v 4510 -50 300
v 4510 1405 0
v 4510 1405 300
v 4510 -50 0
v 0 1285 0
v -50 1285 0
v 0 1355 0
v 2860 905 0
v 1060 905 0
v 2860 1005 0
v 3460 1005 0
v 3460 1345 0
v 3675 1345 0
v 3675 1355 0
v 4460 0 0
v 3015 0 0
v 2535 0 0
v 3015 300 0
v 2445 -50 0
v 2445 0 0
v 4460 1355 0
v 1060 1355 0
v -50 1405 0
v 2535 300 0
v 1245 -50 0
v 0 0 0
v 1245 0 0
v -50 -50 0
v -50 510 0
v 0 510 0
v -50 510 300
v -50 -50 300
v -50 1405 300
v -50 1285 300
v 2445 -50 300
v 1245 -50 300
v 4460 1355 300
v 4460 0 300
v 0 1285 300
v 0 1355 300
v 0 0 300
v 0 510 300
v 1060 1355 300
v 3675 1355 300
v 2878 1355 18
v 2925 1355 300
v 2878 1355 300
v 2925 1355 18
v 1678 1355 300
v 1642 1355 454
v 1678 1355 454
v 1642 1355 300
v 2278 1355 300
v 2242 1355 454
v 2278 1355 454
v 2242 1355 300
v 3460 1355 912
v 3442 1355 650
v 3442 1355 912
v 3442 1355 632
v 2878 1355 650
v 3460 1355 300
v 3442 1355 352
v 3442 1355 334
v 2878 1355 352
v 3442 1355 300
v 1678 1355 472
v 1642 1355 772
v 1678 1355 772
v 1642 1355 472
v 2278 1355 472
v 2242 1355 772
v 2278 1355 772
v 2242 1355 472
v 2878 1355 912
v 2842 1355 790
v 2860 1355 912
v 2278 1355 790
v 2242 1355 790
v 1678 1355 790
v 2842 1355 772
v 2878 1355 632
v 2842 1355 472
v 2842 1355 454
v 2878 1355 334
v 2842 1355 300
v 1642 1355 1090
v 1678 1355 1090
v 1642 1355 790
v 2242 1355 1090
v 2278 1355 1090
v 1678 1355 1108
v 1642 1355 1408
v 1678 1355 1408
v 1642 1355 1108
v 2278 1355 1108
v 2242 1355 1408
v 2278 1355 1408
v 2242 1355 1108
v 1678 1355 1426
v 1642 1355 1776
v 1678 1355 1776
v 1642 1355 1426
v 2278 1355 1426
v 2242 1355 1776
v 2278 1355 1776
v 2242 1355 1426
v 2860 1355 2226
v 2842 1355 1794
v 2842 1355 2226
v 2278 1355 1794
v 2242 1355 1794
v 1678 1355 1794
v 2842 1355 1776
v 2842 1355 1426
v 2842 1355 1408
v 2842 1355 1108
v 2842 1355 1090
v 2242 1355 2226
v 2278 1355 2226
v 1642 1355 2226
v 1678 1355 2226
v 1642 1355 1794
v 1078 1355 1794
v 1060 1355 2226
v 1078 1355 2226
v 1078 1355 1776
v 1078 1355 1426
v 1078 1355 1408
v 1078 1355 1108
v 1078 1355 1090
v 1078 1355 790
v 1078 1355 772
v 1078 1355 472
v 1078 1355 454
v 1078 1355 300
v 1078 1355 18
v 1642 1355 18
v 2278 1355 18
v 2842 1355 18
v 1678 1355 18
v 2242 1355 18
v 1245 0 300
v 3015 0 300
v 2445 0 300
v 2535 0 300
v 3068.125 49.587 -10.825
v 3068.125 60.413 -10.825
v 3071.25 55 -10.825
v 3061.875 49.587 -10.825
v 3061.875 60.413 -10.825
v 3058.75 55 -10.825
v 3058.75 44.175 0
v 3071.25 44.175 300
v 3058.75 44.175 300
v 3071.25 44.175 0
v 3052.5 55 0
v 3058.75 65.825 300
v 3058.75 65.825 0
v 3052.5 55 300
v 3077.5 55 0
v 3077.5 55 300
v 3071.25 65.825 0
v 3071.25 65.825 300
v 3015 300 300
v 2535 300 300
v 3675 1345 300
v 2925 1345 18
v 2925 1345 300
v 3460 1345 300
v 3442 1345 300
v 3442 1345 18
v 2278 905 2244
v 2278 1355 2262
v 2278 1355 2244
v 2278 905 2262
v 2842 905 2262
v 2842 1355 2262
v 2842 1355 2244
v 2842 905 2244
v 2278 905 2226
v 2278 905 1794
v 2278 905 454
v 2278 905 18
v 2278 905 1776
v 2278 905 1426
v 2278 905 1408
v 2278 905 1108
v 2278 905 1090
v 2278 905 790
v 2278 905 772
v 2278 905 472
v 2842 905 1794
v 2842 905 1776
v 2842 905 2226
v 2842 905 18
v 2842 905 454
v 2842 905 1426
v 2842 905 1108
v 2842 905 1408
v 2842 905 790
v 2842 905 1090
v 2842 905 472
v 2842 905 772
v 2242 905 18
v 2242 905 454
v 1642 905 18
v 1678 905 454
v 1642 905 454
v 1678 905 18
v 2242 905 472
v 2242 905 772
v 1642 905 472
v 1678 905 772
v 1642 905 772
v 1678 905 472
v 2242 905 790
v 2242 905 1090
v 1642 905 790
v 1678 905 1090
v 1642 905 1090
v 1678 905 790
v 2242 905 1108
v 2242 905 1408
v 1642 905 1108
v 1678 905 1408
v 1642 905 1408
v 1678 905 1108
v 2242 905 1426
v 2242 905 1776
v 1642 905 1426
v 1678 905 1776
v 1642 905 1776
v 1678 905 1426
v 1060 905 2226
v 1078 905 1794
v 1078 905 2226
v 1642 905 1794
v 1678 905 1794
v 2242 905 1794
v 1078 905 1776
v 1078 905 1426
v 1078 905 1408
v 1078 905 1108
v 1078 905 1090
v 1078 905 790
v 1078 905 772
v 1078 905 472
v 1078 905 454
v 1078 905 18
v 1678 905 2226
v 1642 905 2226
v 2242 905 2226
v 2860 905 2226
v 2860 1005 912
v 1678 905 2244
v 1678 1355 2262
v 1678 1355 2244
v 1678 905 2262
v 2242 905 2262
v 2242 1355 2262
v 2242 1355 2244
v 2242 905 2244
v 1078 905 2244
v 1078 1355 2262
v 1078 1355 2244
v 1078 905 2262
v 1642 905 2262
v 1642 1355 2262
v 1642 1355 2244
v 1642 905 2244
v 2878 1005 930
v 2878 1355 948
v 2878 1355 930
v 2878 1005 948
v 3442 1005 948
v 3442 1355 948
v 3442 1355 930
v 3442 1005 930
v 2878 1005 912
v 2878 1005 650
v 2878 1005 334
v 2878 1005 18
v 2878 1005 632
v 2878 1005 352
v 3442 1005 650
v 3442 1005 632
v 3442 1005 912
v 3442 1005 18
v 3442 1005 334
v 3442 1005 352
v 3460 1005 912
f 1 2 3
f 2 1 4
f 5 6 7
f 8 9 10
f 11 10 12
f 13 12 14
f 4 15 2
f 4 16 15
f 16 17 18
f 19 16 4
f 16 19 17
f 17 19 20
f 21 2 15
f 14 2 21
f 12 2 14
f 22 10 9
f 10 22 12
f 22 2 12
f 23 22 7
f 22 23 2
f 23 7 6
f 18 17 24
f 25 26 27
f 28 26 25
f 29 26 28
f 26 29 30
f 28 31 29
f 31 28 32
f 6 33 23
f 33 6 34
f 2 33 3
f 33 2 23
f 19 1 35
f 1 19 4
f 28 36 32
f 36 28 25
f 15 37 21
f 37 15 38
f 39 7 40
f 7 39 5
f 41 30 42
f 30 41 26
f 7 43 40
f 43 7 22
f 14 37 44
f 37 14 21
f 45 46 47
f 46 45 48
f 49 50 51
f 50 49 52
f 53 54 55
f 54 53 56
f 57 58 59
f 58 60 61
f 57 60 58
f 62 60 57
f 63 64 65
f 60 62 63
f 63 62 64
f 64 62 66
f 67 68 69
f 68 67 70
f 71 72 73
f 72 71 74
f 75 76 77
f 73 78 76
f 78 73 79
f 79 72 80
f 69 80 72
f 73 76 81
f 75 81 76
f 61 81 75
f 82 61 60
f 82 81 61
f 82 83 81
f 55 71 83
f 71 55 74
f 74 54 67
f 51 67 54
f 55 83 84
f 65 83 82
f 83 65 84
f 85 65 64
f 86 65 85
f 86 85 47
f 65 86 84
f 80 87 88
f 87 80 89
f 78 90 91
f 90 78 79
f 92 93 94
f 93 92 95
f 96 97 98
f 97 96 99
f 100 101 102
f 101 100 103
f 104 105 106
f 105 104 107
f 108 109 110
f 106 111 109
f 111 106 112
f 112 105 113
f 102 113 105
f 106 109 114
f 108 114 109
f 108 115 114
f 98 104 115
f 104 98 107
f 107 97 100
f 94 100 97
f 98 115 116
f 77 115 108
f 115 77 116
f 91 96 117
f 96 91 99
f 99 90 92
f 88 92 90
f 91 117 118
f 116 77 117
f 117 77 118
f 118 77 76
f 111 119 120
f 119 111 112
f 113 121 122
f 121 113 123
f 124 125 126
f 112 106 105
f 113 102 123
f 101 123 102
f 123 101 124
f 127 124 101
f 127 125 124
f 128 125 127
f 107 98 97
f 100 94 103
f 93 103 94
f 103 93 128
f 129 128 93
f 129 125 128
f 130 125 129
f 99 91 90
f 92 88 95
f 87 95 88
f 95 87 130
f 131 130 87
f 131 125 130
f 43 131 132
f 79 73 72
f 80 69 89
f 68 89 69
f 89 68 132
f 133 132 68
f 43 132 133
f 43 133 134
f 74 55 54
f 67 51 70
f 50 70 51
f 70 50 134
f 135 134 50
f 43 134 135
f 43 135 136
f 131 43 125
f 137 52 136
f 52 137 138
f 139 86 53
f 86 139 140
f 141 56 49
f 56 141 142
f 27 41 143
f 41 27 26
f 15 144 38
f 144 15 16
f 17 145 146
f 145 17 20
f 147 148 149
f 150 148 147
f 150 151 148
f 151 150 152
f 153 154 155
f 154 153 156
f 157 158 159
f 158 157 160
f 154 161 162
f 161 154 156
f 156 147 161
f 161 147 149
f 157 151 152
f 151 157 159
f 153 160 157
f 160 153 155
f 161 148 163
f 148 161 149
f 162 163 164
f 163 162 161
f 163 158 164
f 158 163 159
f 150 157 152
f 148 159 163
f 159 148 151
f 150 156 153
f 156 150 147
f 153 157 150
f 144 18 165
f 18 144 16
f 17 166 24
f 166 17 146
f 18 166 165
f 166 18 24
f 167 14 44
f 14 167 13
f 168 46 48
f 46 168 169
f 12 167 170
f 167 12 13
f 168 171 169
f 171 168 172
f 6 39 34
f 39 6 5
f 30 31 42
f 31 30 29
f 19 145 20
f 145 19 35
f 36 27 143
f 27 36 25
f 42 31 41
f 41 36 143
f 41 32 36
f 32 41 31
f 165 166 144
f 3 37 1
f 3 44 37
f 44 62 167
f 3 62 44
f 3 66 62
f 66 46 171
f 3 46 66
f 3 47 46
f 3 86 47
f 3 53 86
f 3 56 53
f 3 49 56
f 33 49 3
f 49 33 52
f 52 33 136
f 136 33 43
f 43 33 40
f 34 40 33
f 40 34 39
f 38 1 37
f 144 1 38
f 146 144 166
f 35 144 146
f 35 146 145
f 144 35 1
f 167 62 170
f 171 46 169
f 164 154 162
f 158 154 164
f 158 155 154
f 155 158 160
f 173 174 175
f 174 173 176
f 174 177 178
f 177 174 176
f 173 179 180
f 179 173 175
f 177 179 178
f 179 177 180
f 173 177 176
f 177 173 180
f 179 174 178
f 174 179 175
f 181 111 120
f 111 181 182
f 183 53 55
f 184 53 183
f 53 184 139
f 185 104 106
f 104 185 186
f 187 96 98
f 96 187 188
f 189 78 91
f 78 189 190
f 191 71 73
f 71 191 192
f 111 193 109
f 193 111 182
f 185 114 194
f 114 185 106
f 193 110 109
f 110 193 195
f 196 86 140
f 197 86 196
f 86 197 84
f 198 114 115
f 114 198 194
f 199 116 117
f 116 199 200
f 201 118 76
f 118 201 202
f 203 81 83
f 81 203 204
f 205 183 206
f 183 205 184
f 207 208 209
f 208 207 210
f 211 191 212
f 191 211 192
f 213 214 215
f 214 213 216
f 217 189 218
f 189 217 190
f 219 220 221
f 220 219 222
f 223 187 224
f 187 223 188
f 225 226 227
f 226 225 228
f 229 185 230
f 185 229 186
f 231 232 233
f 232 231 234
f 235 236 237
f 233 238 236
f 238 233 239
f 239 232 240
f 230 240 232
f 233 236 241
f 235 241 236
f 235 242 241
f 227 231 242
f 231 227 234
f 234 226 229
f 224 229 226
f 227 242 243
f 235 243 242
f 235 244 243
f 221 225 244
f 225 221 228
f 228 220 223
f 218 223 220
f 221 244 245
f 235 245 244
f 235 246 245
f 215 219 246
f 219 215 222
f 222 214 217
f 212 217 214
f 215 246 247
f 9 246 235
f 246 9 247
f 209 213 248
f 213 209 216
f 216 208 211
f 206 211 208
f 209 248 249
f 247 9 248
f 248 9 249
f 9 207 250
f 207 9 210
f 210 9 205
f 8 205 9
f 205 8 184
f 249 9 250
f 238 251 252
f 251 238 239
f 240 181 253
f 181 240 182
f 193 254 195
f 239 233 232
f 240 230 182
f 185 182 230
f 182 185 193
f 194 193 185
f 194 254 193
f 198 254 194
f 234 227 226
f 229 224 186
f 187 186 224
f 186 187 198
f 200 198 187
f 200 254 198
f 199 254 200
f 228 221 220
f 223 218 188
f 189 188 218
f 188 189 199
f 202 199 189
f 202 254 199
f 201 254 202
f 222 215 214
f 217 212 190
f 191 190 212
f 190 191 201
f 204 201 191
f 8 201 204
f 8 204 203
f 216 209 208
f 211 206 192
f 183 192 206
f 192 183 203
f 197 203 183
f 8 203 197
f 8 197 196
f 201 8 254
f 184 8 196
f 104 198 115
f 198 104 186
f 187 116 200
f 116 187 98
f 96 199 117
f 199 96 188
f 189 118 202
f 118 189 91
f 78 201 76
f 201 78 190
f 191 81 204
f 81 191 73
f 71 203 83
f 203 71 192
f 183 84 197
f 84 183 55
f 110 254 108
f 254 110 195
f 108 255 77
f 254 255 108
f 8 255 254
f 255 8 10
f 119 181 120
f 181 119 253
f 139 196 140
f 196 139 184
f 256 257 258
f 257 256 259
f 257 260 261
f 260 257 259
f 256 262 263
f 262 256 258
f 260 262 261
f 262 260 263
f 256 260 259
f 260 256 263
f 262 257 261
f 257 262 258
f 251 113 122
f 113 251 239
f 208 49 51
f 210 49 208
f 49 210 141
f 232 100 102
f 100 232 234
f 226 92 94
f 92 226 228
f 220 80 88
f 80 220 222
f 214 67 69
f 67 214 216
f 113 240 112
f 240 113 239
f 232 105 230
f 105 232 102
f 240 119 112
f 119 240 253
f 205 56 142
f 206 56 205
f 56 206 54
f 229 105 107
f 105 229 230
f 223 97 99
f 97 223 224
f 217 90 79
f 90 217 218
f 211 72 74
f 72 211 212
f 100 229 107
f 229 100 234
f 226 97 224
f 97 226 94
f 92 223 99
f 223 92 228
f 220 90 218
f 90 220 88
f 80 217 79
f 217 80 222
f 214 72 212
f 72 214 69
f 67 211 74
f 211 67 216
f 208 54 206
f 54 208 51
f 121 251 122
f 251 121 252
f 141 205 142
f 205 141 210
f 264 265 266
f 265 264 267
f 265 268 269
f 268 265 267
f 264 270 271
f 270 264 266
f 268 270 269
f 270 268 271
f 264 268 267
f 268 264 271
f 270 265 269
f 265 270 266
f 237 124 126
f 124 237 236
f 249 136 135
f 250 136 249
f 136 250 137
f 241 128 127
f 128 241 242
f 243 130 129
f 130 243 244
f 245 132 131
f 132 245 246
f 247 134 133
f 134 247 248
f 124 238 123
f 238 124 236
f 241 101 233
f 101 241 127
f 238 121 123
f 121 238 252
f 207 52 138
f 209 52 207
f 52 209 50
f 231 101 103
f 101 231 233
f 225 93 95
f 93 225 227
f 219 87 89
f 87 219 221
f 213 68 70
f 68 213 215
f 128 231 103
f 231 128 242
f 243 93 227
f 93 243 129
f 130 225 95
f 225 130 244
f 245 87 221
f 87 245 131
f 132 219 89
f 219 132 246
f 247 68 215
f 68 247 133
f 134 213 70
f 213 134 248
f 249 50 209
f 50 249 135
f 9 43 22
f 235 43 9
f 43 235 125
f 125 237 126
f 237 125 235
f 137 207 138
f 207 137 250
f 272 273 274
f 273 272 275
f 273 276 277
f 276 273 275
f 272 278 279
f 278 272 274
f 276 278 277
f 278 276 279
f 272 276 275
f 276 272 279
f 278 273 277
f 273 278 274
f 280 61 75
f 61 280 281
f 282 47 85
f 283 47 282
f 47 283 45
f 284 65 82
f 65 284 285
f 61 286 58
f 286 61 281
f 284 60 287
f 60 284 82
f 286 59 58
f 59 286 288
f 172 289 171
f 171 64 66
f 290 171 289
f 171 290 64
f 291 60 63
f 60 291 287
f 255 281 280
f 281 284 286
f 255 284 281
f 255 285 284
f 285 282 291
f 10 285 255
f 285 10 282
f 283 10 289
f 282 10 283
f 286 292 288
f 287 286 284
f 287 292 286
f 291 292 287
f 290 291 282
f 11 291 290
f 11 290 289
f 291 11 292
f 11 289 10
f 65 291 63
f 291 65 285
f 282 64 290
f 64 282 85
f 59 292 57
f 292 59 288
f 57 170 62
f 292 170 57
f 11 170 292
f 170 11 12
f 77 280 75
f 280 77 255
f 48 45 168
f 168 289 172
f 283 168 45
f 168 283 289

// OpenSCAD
// file: syms.scad
module symY(t) {
    translate(t)
        children();
    mirror([0,1,0])
        translate(t)
            children();
}
module symX(t) {
    translate(t)
        children();
    mirror([1,0,0])
        translate(t)
            children();
}

module symZ(t) {
    translate(t)
        children();
    mirror([0,0,1])
        translate(t)
            children();
}

module	symXY(t) {
	tx=t[0];
	ty=t[1];
	tz=t[2];
	symX([tx,0,0])
	symY([0,ty,tz])
		children();
}

module magnetCut(D,S) {
    cylinder(d=D,h=10);
    for(d=[45,-45])
    rotate(d)
    cube([2*D,S,30],center=true);
}


// calculates the radius from "segment" paramers:
// https://en.wikipedia.org/wiki/Circular_segment
function    circleSlice2radius2(c,h) = (c*c/8/h)+ h/2;

function toInt(str) = 
    let(d = [for (s = str) ord(s) - 48], l = len(d) - 1)
    [for (i = 0, a = d[i];i <= l;i = i + 1, a = 10 * a + d[i]) a][l];
        
// file: kitchen_box.scad
use <syms.scad>

W=18;

function prop(k,v)=[k,v];
function sublist(l,start)=start<len(l) ? [for(i=[start:len(l)-1])  l[i]] : undef;
function getProp(props,k)= (props[0][0] == k) ? props[0][1] : (props == undef ? 
    undef : getProp(sublist(props,1), k)
);


INSET=10;
BACKSET=10;
BACKPLANE_W=1.6;
BACKPLANE_NUT_W=2;

module bBox(e) {
    
    $inner_w=$width-2*W;
    
//    backplaneCenter=[0,depth-3,height/2+W-INSET]
    
    sidePos=-[$width/2-W/2,-$depth/2,-$height/2];

    module element(piece) {
        
        difference() {
            union() {
                if(piece=="R" || piece=="A")
                translate(sidePos)
                cube([W,$depth,$height],center=true);
                if(piece=="L" || piece=="A")
                mirror([1,0,0])
                translate(sidePos)
                cube([W,$depth,$height],center=true);
                if(piece=="B" || piece=="A")
                translate([0,$depth/2,W/2])
                cube([$inner_w,$depth,W],center=true);
                
                if(piece=="A") {
                    $mode="PREVIEW";
                    translate([0,$depth,$height])
                        children();
                }
            }
            
            
            translate([0,BACKSET,$height/2+W-INSET])
            cube([$inner_w+INSET*2,3,$height],center=true);

            $mode="HOLES";
            symX([$width/2,$depth,$height])
                children();
            
        }
    }
    
    if(e=="L") 
        rotate(90,[0,1,0])
        translate(sidePos)
        element(e)
            children();
    if(e=="R") 
        rotate(-90,[0,1,0])
        translate(-sidePos)
        element(e)
            children();
    if(e=="B")
        translate([0,0,-W/2])
        element(e)
            children();
    if(e=="A")
        translate([$width/2,0*$depth,0])
        element(e)
            children();
 //   element(e);
    
}

function abs(x) = x<0?-x:x;
function prefix(s,p)=(len(p)==0 || p==undef)?[]:concat([s+p[0]], prefix(s+p[0],sublist(p,1)) );

module maximera(sizes) {
    HOLE_D=5;
    C0=[    20,
            32,
            224,
            224
    ];
    
    C1=prefix(0,C0);
    
    x=prefix(0,[for(i=sizes) abs(i)]);
    for(i=[0:len(sizes)-1]) {
        off=x[i];
        size=sizes[i];
        
        if($mode=="HOLES") {
            for(x=C1)
                translate([0,-x,-off+50]) {
                rotate(90,[0,1,0])
                cylinder(d=HOLE_D,h=100,center=true);
            }
        }else{
            D=$depth-40;
            o_y=($drawerState=="CLOSED" ? 0 : D-50);
            translate([0,o_y,0]) {
            color([0,1,0])
                hull()
                symX([$width/2,0,0])
                translate([-W/4-2,W/2+1,-off+size-size/2])
                cube([W/2,W,size-4],center=true);

            color([1,0,0])
                hull()
                symX([$width/2-2*W,-D/2,-off+size/2])
                cube([W/2,D,size-10],center=true);
            }
            
//            cube(100);
            // front
        }
        
        
    }
}


module m60(pos,sizes) {
    $width=600;
    $drawerState="CLOSED";
    translate(pos)
    translate([$width/2,$depth,0])
//    posNeg()
    m60_0(sizes);
}

FRONT_SP=2;


module posNeg() {
    difference() {
        union(){
            $positive=true;
            children();
        }
        union(){
            $positive=false;
            children();
        }
    }
}


module m60i(size) {
    echo(str("F-A_",size));
    $depth=D37;
    m60(    $internal=true, $fronts=false,[0,0,0],[size]);

    translate([0,0,0])
    children();
}



module m60a(size) {
    echo(str("F-A_",size));
    $depth=D37;
    m60([0,0,0],[size]);
    
    translate([0,0,-size])
    children();
}

module m60b(size) {
    echo(str("F-A_",size));
    $depth=D60;
    m60([0,0,0],[size]);
    
    translate([0,0,-size])
    children();
}

module m60c(size) {
    echo(str("F-A_",size));
    $depth=$boxDepth;
    m60([0,0,0],[size]);
    translate([0,0,-size])
    children();
}


module m60ic(size) {
    echo(str("F-A_",size));
    $depth=$boxDepth;
    m60(    $internal=true, $fronts=false,[0,0,0],[size]);

    translate([0,0,0])
    children();
}



module m60_0(sizes) {
    HOLE_D=5;
    HANDLE_HW=128;
    HANDLE_Y=125/2;
    
    C0=[    20,
            17,
            32-17,
            224-32,
            17,
            32-17,
            224
    ];
    
    C1=prefix(0,C0);
    echo("C1",C1);
    
    x=prefix(0,[for(i=sizes) abs(i)]);
    for(i=[0:len(sizes)-1]) {
        off=x[i];
        size=sizes[i];
        
            D=$depth-40;
        o_y=($drawerState=="CLOSED" ? 0 : D-50);
        translate([0,0,-off])
        
        if(!$positive) {
            for(x=C1)
                symX([$width/2,0,0])
                translate([0,-x,50]) {
                rotate(90,[0,1,0])
                cylinder(d=HOLE_D,h=100,center=true);
                    
                }
                if(!$internal)
            translate([0,o_y,0]) 
                rotate(90,[1,0,0]) {
                    dx=(3-FRONT_SP)/2;
                    H1=dx+39;
                    H2=dx+58;
                    H3=dx+117;
                    H4=dx+136;
                    J=533/2;
                    D=5;
                    
                    symX([J,H1,0])
                    cylinder($fn=16,d=D,h=3*W,center=true);
                    symX([J,H2,0])
                    cylinder($fn=16,d=D,h=3*W,center=true);
                    
                    if(size>200) {
                        symX([J,H3,0])
                        cylinder($fn=16,d=D,h=3*W,center=true);
                        symX([J,H4,0])
                        cylinder($fn=16,d=D,h=3*W,center=true);
                    }
                    
                    //x
                    symX([HANDLE_HW/2,size-HANDLE_Y,0])
                    cylinder($fn=16,d=D,h=3*W,center=true);
                    
                }
        }else{
            if($fronts)
            translate([0,o_y,0]) {
            color([0,1,0]) {
//                translate([-W/4-2,W/2+1,-off+size-size/2])
                translate([0,W/2+1,size/2])
                cube([$width-FRONT_SP,W,size-FRONT_SP],center=true);
                if(false)
                hull() {
                    OFF_L=0;//$thinL? W/2:0;
                    OFF_R=0;//$thinR? W/2:0;
                    symX([$width/2,0,0])
                    translate([-W/4-2,W/2+1,size-size/2])
                    cube([W/2,W,size-4],center=true);
                }
                
            }
            if($machines)
            color([1,0,0])
            hull()
            symX([HANDLE_HW/2,W+W,size-HANDLE_Y]) {
                cylinder($fn=16,d=3,h=W,center=true);
            }

            if($machines)
            color([1,0,0])
                hull()
                symX([$width/2-2*W,-D/2,size/2])
                cube([W/2,D,size-10],center=true);
            }
            
//            cube(100);
            // front
        }
        
        
    }
}


module z() {
    children();
}

D60=590;
D37=366;

mode="A";
bBox($width=600,$height=800,$depth=D37,mode) {
$fronts=true;
$machines=true;

    $drawerState="CLOSED";
    sizes=[125];
//    posNeg()
    m60([-$width/2,-$depth,0],[125,125,800-250]);
}
// file: hulls.scad
module hullPairs(pos,close=true){
    for(i=[0:len(pos)-2]){
        hull() {
            translate(pos[i+0]) children();
            translate(pos[i+1]) children();
        }
    }
    if(close)
    hull() {
        translate(pos[0]) children();
        translate(pos[len(pos)-1]) children();
    }
    
}
// file: furniture.scad
use <hulls.scad>
use <kitchen_box.scad>

function sublist(l,start)=start<len(l) ? [for(i=[start:len(l)-1])  l[i]] : undef;
function prefix(s,p)=(len(p)==0 || p==undef)?[]:concat([s+p[0]], prefix(s+p[0],sublist(p,1)) );

module posNeg() {
    difference() {
        union(){
        $positive=true;
        children();
        }
        union(){
        $positive=false;
        children();
        }
    }
}

module ppp(name,dims="") {
    if($positive)
        echo(name,dims);
    if($positive)
    if($part==undef || $part==name) 
        children();
}


module eXY(name, dX, dY) {
    ppp(str(name,"-XY"),str(dX,"x",dY))
        cube([dX,dY,$W]);
}

module eYZ(name, dY, dZ) {
    ppp(str(name,"-YZ"),str(dY,"x",dZ))
        cube([$W,dY,dZ]);
}
module eXZ(name, dX, dZ) {
    ppp(str(name,"XZ"),str(dZ,"x",dX))
        cube([dX,$W,dZ]);
}


use <syms.scad>

module doors0(name,w,h,d,cnt=2,clips=[50,-50],glass=false) {
    W=$W;
    module cube1(dim,glass) {
        difference() {
            E=2*80;
            cube(dim,center=true);
            if(glass)
            cube(dim+[-E,1,-E],center=true);
        }
    }
    FRONT_SP=2;
    
    cL=[w/4,W/2,h/2];
    cR=cL+[w/2,0,0];
    translate([0,d,0])
    if($positive) {
        
        doorLabel=glass?"__GLASSDOOR: ":"__DOOR: ";
        if($fronts)
            
        color([0,1,1]){
            if(cnt==2) {
                ww=w/2-FRONT_SP;
                hh=h-FRONT_SP;
                rotate($openDoors?90:0)
                translate(cL)
                cube1([ww,W,hh],glass);
                translate(cR)
                cube1([ww,W,hh],glass);
                echo(doorLabel,name,ww,hh);
                echo(doorLabel,name,ww,hh);
            }else{
                ww=w-FRONT_SP;
                hh=h-FRONT_SP;
                rotate($openDoors?90:0)
                translate((cL+cR)/2)
                cube1([ww,W,hh],glass);
                echo(doorLabel,name,ww,hh);
            }
        }
    }else{
        
            C0=[    20,
                    32,
            ];
            
            C1=prefix(0,C0);
        
        HOLE_D=5;
        for(y0 =clips) {
            y=(y0<0) ? y0+h  : y0;
        translate([w/2,0,0])
            for(x=C1)
                symX([w/2-W/2,0,0])
                translate([0,-x,y]) {
                rotate(90,[0,1,0])
                cylinder(d=HOLE_D,h=W+.1,center=true);
                    
                }
            }
        
        
    }
}

module doors(name,h,cnt=2,clips=[50,-50],glass=false) {
    
    translate([0,0,-h])
        doors0(str($name,name),$w,h,$d,cnt,clips,glass);
    
    translate([0,0,-h])
        children();
    
}


module cabinet(name,w,h,d) {
    $name=name;
    $w=w;
    $h=h;
    $d=d;
    
    eYZ(name,d,h);
    translate([w-$W,0,0])
    eYZ(name,d,h);
    
    translate([$W,0,0])
    eXY(name,w-2*$W,d);
    
    if($positive) {
        echo(str(name,"-back"),str(h-15,"x",w-15));
    }
    
    translate([0,0,$h])
    children();
}

module cBeams() {
    W=$W;
    translate([W,0,-W])
    eXY(str($name,"-beam"),$w-2*W,100);
    translate([W,$d-100,-W])
    eXY(str($name,"-beam"),$w-2*W,100);
    children();
}

module partitionBeams(x,fullH) {
    
    beamH=$h-2*$W - fullH;
    BACK_WIDTH=4;

    
    D=100;
    if(beamH>0)
    translate([x-D/2,D,-$W])
    eXY(str($name,"partC",x),D,$d-BACK_WIDTH-2*D);
    
    translate([x-$W,0,-$h+$W]) {
        translate([0,BACK_WIDTH,0])
        eYZ(str($name,"partA",x),$d-BACK_WIDTH,fullH);

        translate([0,0,fullH]) 
        color([0,0,1]) {
            if(beamH>0)
            translate([0,0,0])
            eYZ(str($name,"partB",x),D,beamH);
            
            if(beamH>0)
            translate([0,$d-D,0])
            eYZ(str($name,"partB",x),D,beamH);
        }
    }
    
    $oldw=$w;
    {
        $w=x;
        children(0);
    }
    translate([x-$W,0,0]) {
        $w=$oldw-x+$W;
        children(1);
    }
}


module             slideDoors() {

    $oldd=$d;
    {
        $d=$oldd-$W;
        children();
    }
}

module cTop() {
    W=$W;
    translate([W,0,-W])
    eXY(str($name,"cb"),$w-2*W,$d);
    children();
}


module m60_0(sizes) {
    FRONT_SP=2;
    HOLE_D=5;
    W=$W;
    HANDLE_HW=128;
    HANDLE_Y=125/2;
    
    C0=[    20,
            17,
            32-17,
            224-32,
            17,
            32-17,
            224
    ];
    
    C1=prefix(0,C0);
//    echo("C1",C1);
    
    x=prefix(0,[for(i=sizes) abs(i)]);
    for(i=[0:len(sizes)-1]) {
        off=x[i];
        size=sizes[i];
        
            D=$d-40;
        o_y=($drawerState=="CLOSED" ? 0 : D-50);
        translate([0,0,-off])
        
        if(!$positive) {
            for(x=C1)
                symX([$w/2,0,0])
                translate([0,-x,50]) {
                rotate(90,[0,1,0])
                cylinder(d=HOLE_D,h=100,center=true);
                    
                }
                if(!$internal)
            translate([0,o_y,0]) 
                rotate(90,[1,0,0]) {
                    dx=(3-FRONT_SP)/2;
                    H1=dx+39;
                    H2=dx+58;
                    H3=dx+117;
                    H4=dx+136;
                    J=533/2;
                    D=5;
                    
                    symX([J,H1,0])
                    cylinder($fn=16,d=D,h=3*W,center=true);
                    symX([J,H2,0])
                    cylinder($fn=16,d=D,h=3*W,center=true);
                    
                    if(size>200) {
                        symX([J,H3,0])
                        cylinder($fn=16,d=D,h=3*W,center=true);
                        symX([J,H4,0])
                        cylinder($fn=16,d=D,h=3*W,center=true);
                    }
                    
                    //x
                    symX([HANDLE_HW/2,size-HANDLE_Y,0])
                    cylinder($fn=16,d=D,h=3*W,center=true);
                    
                }
        }else{
            if($fronts)
            translate([0,o_y,0]) {
            color([0,1,0]) {
//                translate([-W/4-2,W/2+1,-off+size-size/2])
                translate([0,W/2+1,size/2])
                cube([$w-FRONT_SP,W,size-FRONT_SP],center=true);
                if(false)
                hull() {
                    OFF_L=0;//$thinL? W/2:0;
                    OFF_R=0;//$thinR? W/2:0;
                    symX([$w/2,0,0])
                    translate([-W/4-2,W/2+1,size-size/2])
                    cube([W/2,W,size-4],center=true);
                }
                
            }
            if($machines)
            color([1,0,0])
            hull()
            symX([HANDLE_HW/2,W+W,size-HANDLE_Y]) {
                cylinder($fn=16,d=3,h=W,center=true);
            }

            if($machines)
            color([1,0,0])
                hull()
                symX([$w/2-2*W,-D/2,size/2])
                cube([W/2,D,size-10],center=true);
            }
            
        }
    }
}

    
module shelf(h,SHELF_INSET=12) {
    
    color([0,1,1])
    translate([$W,0,-h])
    eXY(str($name,"-Shelf"),$w-2*$W,$d-SHELF_INSET);
    
    //    translate([0,0,-h])
    children();
}

module maximera1(h) {
    assert(len(search($w,[600,800]))>0,str("not supported maximera width:",$w));
//    cube(1000);
    
    if($positive)
    echo("__DOOR ","maximera",$w-2,h-2);

    
    translate([$w/2,$d,0])
    m60_0([h]);
    translate([0,0,-h])
        children();
}
// main file
use <furniture.scad>
use <hulls.scad>

ROOM_X=4460;
ROOM_Y=1355;
ROOM_Z=2020+730;
ROOM_WALL=50;

W=18;
$W=18;
M60I=564;
M60W=M60I+W;

module room(cut) {
    R=[ROOM_X,ROOM_Y,ROOM_Z];
    Q=[ROOM_WALL,ROOM_WALL,0];
    P=[0,0,ROOM_WALL];
    
    EX=[2*ROOM_WALL,0,0];
    EY=[0,2*ROOM_WALL,0];
    
    module walls() {
        difference() {
            translate(-Q)
            cube(R+2*Q);

            translate(-P)
            cube(R+2*P);
        }
    }
    module doorCut() {
        D=[ROOM_WALL,775,2020];
        translate([0,510,0])
        translate(-EX)
        cube(D+2*EX);
    }
    module windowCut() {
        D=[1200,ROOM_WALL,1200];
        H=cut=="Z"?0:910;
        translate([1245,0,H])
        translate(-EY)
        cube(D+2*EY);
    }
    module gasLine() {
        Y=55;
        H=2290;
        p=[ [ROOM_X-1395,Y,0],
            [ROOM_X-1395,Y,H],
            [Y,Y,H],
            [Y,380,H],
            [0,380,H]   ];
        
        color([1,0,0])
        hullPairs(p,false)
            sphere(d=25,$fn=6);
    }
    module gasConvector() {
        
        translate([ROOM_X-1395-50-480,0,0])
        color([1,0,0])
        cube([480,300,840]);
    }
    module electricBox() {
        D=10;
        S=700+2*25;
        H=cut=="Z"?0:900;
        color([0,0,1])
        translate([ROOM_X-785-S,ROOM_Y,H])
        mirror([0,1,0])
        cube([S,D,S]);
    }
    
    difference() {
        union() {
            walls();
            gasLine();
            gasConvector();
            electricBox();
        }
        doorCut();
        windowCut();
        
        if(cut=="Z") {
            translate([0,0,300])
            translate(-2*Q)
            cube(R+4*Q);
        }
    }
    
    
    
}

module cabinet0(name,D,heights) {
    

    Z=prefix(0,heights);
    H=Z[len(Z)-1]+W;
if(false) {
    eYZ(name,D,H);
    translate([M60W,0,0])
    eYZ(name,D,H);
    
    for(z=Z)
    translate([W,0,z])
    eXY(name,M60I,D);
}else{
    cabinet(name,600,H,D)
//        cTop()
        for(z=Z)
            if(z<H-W)
            shelf(z-W,0);
        
}


}

module s2() {
    cabinet0("S2",350,[0,280+W,280+W,280+W]);
}

module partsL() {
    for(x=[0:600:1200])
        translate([ROOM_X-x-1600,ROOM_Y,0])
        mirror([1,0,0])
        mirror([0,1,0])
            cabinet0("L",450,[0,450+W,350+W,300+W,300+W,300+W,400+W]);
    for(x=[-600])
        translate([ROOM_X-x-1600,ROOM_Y,0])
        mirror([1,0,0])
        mirror([0,1,0])
            s2();

}
module partsR() {
    translate([ROOM_X-700,0,0])
        mirror([1,0,0])
            cabinet0("R",400,[0,450+W,350+W,300+W,300+W,300+W,400+W]);

//    cabinet("S1",300,[0,280+W,280+W,280+W]);
    for(x=[0:600:1800])
    translate([x,0,0])
    s2();
    
    for(z=[1200:300:2100])
    translate([0,0,z])
    eXY("PP",1200,250);
}


$part=undef;
mode="preview";

if(mode=="previewL") {
    room("Z");
    posNeg()
    partsL();
}

if(mode=="previewR") {
    room("Z");
    posNeg()
    partsR();
}


if(mode=="preview") {
    room("Z");
    posNeg() {
        partsL();
//        partsR();
    }
}
